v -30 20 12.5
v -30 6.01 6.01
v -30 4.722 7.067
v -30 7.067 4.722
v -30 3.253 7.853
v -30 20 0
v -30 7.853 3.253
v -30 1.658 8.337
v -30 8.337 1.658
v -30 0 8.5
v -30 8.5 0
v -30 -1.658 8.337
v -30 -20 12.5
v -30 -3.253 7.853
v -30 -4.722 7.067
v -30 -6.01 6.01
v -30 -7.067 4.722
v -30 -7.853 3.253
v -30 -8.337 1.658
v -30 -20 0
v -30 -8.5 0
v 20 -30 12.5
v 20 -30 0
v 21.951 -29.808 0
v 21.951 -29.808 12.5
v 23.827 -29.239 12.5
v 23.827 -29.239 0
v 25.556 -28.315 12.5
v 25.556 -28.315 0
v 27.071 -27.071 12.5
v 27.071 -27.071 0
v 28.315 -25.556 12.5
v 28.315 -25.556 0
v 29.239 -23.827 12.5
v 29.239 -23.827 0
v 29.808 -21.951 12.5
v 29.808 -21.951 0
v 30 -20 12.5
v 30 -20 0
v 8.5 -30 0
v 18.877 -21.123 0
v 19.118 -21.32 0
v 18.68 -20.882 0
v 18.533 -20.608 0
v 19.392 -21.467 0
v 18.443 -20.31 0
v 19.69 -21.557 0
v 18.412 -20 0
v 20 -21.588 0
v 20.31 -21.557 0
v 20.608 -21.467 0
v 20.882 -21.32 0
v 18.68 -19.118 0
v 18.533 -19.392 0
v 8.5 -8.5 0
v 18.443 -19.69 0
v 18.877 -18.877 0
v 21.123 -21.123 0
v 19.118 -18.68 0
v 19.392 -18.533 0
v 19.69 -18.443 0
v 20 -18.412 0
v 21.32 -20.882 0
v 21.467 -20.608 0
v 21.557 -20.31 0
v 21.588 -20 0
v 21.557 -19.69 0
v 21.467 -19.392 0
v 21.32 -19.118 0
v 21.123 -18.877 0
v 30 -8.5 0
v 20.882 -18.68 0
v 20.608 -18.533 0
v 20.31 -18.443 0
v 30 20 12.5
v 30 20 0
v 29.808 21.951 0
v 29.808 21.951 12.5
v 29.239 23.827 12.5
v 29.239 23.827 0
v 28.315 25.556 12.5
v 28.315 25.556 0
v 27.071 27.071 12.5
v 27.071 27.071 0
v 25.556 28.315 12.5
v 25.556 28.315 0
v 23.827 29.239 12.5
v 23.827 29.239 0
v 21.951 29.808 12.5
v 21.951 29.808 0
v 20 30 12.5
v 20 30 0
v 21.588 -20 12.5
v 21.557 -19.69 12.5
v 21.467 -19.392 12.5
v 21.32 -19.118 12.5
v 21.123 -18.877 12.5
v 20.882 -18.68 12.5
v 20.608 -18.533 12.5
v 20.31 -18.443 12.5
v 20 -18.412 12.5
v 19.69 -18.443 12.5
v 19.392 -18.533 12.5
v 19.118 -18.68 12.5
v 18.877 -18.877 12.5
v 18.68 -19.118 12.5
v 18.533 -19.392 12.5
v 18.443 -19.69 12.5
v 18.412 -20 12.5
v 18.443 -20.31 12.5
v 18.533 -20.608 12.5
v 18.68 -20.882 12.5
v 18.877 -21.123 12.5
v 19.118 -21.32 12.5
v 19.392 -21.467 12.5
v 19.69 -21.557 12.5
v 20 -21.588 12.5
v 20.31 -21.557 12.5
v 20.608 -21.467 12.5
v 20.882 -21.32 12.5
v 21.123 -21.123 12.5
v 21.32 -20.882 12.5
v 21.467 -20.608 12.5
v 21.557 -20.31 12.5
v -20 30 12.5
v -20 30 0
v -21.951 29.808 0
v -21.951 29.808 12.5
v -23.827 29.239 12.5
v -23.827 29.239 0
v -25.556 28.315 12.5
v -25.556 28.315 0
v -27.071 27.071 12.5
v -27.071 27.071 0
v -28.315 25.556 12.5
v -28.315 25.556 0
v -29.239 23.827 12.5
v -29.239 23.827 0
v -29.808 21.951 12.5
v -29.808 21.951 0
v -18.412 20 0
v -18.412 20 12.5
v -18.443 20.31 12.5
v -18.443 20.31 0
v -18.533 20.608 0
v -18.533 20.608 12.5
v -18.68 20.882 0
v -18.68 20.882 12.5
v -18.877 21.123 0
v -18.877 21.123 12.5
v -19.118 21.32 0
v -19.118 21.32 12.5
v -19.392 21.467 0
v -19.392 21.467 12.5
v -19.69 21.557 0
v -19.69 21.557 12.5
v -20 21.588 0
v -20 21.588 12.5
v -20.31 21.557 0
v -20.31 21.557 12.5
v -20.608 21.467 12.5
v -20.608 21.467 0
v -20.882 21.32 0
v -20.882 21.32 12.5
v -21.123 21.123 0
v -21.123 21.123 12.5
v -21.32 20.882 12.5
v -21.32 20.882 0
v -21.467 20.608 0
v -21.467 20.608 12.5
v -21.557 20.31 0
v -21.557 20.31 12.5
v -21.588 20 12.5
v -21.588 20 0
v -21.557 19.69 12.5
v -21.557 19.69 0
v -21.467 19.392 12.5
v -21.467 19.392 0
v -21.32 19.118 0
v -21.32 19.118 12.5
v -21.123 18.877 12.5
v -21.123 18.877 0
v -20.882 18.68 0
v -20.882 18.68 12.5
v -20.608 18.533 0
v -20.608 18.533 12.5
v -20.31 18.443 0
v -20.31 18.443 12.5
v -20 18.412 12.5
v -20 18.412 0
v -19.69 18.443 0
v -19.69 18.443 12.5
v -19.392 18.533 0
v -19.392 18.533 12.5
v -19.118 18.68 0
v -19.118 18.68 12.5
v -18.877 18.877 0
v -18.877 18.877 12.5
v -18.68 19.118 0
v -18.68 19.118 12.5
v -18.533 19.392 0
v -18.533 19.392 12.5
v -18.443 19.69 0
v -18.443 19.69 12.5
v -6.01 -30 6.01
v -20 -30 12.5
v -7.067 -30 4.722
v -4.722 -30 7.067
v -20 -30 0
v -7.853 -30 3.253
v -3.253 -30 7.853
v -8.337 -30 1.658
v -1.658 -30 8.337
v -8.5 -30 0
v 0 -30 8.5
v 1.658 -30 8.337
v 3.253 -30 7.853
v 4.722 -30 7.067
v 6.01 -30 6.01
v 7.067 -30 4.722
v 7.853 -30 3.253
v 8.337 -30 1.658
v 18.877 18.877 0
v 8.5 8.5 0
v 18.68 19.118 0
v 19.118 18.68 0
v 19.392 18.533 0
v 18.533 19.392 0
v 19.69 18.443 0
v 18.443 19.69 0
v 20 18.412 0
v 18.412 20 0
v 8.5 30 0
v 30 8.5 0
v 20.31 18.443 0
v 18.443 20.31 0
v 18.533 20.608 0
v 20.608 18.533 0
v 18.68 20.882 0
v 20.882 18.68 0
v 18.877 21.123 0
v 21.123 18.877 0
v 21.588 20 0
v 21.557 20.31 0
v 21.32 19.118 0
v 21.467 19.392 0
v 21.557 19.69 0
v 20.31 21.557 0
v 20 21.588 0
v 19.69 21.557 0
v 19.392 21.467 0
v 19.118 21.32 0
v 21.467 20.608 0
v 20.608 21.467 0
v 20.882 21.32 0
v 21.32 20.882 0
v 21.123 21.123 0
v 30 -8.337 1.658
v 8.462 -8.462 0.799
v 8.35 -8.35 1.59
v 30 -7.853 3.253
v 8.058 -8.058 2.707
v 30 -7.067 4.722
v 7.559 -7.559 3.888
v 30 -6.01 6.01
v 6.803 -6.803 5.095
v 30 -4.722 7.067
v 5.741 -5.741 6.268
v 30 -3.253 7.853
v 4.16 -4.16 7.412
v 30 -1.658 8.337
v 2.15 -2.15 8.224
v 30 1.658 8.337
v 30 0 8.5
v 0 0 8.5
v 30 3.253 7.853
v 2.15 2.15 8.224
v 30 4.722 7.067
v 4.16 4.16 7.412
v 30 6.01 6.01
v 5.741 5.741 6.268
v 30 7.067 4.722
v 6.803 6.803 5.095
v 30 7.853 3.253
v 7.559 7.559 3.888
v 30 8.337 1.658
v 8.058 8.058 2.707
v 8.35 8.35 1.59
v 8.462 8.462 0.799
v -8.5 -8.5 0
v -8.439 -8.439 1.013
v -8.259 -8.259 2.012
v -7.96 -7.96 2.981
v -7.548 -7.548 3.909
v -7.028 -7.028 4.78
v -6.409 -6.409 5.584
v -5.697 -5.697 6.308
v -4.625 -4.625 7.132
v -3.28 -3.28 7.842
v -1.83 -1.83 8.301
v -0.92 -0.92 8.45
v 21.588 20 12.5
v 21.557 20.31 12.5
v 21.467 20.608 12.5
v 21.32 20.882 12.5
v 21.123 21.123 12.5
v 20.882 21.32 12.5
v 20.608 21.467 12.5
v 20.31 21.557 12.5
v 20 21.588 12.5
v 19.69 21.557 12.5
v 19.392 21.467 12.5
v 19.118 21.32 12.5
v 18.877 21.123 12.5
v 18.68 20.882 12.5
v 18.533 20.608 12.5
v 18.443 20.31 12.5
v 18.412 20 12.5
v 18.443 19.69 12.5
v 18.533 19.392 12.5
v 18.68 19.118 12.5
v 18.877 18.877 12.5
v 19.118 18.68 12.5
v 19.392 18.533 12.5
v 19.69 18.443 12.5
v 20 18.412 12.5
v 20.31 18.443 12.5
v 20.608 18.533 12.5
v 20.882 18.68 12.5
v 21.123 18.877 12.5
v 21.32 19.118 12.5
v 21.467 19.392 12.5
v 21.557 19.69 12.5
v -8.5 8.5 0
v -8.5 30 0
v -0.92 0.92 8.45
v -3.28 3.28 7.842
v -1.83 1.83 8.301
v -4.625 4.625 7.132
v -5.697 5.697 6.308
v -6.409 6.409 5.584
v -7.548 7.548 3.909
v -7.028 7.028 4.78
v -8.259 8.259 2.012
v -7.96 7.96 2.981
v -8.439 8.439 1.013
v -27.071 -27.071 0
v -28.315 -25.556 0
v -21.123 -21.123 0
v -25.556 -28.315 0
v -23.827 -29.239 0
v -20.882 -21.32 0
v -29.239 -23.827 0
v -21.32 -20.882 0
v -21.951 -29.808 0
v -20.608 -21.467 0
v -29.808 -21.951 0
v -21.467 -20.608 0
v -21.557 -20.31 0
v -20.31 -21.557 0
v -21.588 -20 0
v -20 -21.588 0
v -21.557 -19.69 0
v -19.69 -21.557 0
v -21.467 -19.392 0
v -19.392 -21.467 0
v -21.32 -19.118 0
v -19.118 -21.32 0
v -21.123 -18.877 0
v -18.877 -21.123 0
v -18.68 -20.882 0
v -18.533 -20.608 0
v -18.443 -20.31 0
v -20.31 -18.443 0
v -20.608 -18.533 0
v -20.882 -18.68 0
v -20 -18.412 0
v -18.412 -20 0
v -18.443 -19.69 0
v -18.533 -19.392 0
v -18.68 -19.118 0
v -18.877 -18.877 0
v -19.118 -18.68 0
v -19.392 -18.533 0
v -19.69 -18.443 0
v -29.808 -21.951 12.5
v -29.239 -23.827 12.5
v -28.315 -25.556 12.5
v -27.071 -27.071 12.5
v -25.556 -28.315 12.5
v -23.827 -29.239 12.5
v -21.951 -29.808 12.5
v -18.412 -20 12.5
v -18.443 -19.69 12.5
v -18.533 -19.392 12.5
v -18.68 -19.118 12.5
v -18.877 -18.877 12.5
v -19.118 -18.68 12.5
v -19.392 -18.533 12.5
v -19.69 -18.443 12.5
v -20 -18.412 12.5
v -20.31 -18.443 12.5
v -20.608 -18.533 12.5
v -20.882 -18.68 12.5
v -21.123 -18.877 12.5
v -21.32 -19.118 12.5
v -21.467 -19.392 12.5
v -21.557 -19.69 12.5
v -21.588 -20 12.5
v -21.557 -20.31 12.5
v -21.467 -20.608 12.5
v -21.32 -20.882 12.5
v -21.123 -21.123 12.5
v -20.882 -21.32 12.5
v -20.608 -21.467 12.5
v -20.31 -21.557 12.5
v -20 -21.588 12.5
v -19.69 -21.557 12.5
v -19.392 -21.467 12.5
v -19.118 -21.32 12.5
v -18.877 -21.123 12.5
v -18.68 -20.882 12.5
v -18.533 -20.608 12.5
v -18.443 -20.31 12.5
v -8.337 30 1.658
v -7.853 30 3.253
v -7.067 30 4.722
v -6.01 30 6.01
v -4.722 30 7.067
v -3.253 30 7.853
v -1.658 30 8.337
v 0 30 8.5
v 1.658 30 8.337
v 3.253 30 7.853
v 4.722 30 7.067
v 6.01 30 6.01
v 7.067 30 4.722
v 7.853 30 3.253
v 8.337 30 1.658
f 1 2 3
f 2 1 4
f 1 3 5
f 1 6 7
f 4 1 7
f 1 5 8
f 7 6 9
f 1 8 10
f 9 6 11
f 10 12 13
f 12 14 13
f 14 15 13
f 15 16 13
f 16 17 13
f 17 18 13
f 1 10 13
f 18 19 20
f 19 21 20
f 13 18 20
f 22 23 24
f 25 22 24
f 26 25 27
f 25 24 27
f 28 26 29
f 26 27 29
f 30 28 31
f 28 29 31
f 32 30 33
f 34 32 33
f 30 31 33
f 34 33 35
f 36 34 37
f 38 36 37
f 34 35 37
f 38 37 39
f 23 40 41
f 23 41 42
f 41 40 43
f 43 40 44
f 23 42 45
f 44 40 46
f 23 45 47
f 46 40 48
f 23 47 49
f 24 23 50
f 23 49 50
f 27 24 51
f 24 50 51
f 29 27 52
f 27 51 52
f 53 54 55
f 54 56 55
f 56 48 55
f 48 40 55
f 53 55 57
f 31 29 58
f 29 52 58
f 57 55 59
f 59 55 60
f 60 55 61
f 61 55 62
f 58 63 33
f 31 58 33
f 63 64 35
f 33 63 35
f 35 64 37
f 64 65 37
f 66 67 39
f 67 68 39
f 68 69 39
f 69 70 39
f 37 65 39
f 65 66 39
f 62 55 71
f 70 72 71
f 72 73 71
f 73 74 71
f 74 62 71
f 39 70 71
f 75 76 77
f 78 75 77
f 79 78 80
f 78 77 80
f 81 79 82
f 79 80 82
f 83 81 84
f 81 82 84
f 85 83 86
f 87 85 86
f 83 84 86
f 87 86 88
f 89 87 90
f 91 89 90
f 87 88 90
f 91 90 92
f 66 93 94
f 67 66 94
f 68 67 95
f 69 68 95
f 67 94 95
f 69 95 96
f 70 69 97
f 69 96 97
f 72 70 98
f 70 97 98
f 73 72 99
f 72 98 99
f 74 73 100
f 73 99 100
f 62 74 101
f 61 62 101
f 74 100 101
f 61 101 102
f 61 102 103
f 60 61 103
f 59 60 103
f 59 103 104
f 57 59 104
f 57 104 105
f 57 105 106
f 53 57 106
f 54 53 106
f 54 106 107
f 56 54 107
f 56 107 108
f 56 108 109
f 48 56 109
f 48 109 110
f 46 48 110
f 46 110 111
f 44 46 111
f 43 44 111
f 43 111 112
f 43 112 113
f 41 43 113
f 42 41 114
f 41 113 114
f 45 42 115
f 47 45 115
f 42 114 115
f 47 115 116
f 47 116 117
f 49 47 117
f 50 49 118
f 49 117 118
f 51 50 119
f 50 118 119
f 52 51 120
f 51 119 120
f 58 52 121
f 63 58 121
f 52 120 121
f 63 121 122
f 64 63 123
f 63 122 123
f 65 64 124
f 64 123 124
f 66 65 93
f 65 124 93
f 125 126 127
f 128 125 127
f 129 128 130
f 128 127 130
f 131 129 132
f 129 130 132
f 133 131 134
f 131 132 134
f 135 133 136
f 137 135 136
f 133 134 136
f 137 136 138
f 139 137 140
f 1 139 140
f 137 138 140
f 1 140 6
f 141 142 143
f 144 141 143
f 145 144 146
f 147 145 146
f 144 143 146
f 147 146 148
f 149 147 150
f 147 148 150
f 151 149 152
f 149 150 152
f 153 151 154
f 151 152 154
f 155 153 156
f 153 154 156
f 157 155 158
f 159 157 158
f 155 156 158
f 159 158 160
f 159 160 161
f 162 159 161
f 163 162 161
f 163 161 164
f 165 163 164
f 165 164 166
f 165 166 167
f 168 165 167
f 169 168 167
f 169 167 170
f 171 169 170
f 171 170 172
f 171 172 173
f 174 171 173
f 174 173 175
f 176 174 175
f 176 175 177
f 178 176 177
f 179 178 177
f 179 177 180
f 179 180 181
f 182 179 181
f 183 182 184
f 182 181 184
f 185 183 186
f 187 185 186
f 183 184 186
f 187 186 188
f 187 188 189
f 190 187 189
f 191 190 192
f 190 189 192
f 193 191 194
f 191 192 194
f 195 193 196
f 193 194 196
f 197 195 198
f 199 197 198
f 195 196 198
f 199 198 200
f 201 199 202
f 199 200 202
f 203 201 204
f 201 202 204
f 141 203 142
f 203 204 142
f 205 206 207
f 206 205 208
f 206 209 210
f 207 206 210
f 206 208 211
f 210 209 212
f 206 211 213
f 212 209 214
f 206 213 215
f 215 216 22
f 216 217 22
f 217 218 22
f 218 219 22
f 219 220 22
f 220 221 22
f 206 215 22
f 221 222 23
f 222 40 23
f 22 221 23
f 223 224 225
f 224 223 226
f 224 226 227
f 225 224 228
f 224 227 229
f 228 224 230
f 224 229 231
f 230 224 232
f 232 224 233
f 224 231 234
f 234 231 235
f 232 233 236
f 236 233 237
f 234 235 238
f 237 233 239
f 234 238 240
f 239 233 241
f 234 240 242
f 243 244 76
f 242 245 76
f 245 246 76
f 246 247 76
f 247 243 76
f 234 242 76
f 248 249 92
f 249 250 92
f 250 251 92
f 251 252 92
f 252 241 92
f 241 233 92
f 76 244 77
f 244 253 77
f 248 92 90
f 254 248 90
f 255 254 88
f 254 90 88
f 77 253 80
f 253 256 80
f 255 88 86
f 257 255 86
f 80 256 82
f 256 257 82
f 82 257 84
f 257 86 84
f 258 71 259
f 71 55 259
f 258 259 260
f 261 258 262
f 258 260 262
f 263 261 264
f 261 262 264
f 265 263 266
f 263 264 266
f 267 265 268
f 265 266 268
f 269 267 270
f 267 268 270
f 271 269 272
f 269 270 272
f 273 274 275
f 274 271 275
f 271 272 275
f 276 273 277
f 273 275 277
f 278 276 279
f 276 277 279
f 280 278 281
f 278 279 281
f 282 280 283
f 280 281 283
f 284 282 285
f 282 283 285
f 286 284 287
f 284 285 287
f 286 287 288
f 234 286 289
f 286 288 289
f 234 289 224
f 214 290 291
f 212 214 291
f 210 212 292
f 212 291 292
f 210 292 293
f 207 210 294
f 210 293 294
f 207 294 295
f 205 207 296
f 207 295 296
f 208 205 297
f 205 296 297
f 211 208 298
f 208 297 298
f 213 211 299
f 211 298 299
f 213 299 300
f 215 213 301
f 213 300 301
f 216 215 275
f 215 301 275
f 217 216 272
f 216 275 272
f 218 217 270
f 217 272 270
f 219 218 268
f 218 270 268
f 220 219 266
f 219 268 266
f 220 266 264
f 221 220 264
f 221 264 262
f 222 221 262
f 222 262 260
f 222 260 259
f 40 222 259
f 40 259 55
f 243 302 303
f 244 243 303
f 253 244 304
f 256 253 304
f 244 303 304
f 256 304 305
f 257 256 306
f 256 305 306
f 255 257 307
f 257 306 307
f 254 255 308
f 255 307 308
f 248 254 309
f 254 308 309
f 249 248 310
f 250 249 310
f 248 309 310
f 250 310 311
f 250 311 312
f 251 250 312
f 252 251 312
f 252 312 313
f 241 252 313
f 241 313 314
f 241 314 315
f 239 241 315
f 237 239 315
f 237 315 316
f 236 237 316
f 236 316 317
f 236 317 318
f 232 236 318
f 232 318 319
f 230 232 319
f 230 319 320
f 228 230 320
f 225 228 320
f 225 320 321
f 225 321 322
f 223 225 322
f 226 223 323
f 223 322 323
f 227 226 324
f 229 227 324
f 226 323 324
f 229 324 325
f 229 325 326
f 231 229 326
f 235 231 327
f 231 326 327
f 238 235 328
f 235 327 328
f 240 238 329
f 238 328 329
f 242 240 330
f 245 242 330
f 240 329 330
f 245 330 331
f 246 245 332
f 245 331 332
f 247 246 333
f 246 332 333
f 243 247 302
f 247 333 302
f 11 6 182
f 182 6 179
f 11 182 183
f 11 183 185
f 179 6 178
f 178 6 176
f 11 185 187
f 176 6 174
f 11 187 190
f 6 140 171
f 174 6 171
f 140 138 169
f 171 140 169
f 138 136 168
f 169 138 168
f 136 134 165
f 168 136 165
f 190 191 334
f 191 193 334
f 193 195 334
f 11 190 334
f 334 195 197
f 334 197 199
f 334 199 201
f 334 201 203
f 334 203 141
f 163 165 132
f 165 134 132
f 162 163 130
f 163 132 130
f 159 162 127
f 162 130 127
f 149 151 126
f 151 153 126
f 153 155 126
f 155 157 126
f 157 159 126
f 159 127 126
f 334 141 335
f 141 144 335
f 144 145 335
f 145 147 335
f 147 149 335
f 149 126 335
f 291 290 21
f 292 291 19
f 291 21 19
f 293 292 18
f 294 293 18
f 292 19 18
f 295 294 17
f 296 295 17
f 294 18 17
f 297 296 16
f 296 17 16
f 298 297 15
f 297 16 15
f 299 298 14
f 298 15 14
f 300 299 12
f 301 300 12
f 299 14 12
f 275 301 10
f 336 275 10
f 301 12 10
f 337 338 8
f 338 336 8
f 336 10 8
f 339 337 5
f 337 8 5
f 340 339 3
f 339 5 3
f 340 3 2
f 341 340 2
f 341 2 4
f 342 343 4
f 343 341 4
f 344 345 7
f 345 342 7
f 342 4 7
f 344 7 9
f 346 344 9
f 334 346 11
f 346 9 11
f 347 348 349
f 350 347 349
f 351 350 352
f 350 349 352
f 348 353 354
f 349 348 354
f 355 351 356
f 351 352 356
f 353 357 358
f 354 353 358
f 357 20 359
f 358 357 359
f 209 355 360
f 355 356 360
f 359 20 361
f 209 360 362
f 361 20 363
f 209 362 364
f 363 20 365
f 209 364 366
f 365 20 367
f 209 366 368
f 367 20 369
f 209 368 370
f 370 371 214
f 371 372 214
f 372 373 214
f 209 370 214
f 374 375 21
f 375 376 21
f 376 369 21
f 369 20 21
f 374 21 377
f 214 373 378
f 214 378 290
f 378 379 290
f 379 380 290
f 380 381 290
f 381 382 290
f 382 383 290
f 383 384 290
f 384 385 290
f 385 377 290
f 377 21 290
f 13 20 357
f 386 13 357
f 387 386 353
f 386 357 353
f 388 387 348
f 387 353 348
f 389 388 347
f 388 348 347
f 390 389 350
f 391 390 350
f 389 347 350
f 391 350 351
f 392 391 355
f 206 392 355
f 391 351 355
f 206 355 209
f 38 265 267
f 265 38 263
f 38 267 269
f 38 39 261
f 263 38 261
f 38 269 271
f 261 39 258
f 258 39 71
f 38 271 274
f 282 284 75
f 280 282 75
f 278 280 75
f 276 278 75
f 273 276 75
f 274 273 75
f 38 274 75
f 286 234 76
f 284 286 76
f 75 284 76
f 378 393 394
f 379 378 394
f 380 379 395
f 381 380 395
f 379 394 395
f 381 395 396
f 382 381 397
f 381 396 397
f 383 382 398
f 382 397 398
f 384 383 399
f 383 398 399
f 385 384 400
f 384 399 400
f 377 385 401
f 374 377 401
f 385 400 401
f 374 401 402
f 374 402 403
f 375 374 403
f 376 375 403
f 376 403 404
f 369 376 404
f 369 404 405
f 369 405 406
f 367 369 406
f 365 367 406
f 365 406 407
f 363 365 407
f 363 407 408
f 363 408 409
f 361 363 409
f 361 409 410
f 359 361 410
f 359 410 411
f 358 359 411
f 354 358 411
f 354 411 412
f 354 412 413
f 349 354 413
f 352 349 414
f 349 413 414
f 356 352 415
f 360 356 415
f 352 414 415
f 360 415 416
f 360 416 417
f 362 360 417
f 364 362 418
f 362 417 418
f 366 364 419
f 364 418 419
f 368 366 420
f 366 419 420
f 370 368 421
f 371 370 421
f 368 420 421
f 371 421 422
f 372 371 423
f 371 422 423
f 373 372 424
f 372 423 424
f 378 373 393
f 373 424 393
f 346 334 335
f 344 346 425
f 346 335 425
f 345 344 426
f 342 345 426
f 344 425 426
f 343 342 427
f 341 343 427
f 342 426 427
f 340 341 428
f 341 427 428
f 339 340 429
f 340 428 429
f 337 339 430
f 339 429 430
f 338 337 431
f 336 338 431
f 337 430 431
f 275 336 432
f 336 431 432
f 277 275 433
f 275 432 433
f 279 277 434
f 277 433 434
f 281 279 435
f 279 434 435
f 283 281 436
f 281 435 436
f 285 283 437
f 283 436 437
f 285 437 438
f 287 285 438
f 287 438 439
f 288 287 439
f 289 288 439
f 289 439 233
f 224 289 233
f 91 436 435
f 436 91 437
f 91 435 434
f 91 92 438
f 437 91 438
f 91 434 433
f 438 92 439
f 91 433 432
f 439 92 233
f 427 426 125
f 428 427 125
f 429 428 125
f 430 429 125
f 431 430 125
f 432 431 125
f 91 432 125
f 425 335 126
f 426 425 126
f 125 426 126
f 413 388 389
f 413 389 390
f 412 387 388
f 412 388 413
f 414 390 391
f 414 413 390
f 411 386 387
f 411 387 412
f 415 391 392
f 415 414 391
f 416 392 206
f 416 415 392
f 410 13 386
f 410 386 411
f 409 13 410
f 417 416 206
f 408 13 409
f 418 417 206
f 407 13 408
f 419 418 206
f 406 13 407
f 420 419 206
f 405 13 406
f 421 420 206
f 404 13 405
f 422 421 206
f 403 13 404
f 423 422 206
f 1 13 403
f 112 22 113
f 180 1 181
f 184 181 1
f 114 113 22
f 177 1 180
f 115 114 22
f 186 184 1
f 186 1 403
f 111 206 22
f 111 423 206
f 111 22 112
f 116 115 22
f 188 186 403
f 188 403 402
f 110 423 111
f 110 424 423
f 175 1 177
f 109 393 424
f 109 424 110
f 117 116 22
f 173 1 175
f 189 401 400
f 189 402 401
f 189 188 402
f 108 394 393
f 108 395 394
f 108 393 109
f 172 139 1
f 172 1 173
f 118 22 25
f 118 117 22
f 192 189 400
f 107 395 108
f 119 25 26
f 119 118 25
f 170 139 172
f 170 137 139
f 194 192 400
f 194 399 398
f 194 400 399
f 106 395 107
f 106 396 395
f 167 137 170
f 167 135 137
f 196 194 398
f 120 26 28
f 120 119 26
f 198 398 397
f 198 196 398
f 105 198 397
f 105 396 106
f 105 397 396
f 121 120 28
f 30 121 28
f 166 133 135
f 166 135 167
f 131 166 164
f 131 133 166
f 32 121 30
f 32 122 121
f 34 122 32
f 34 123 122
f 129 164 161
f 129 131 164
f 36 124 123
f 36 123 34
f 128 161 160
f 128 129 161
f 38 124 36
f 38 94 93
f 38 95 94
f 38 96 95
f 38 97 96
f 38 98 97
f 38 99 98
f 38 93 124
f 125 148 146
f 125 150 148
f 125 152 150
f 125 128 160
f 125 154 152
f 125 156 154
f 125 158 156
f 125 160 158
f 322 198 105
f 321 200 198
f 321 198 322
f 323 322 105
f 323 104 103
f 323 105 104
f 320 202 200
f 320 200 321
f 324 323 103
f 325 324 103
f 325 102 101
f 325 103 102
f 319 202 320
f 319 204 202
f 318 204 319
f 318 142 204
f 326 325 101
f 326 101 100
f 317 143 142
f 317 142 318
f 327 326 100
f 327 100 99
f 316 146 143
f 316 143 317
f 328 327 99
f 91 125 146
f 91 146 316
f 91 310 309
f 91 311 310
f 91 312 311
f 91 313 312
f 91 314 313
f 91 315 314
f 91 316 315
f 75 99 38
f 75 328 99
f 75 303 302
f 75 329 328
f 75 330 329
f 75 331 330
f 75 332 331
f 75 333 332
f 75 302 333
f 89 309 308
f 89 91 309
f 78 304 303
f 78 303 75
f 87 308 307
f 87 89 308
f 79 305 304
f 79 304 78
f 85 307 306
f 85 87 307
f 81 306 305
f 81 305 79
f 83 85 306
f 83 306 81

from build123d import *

# Parameters (mm, degrees)
SALIENTE_EXTRUIR1_DEPTH = 12.5
CROQUIS2_R              = 8.5
CORTAR_EXTRUIR1_DEPTH   = 41.25
CROQUIS3_R              = 8.5
CORTAR_EXTRUIR2_DEPTH   = 82.5
CROQUIS4_R              = 1.5875
CORTAR_EXTRUIR3_DEPTH   = 82.5


with BuildPart() as part:
    # Croquis1 → Saliente-Extruir1 (new body)
    with BuildSketch(Plane.XY):
        with BuildLine():
            Line((-20, -30), (20, -30))
            ThreePointArc((20, -30), (27.071067812, -27.071067812), (30, -20))
            Line((30, -20), (30, 20))
            ThreePointArc((30, 20), (27.071067812, 27.071067812), (20, 30))
            Line((20, 30), (-20, 30))
            ThreePointArc((-20, 30), (-27.071067812, 27.071067812), (-30, 20))
            Line((-30, 20), (-30, -20))
            ThreePointArc((-30, -20), (-27.071067812, -27.071067812), (-20, -30))
        make_face()
    extrude(amount=SALIENTE_EXTRUIR1_DEPTH)

    # Croquis2 → Cortar-Extruir1 (cut, symmetric)
    with BuildSketch(Plane(origin=(0, 0, 0), x_dir=(1, 0, 0), z_dir=(0, 1, 0))):
        Circle(CROQUIS2_R)
    extrude(amount=CORTAR_EXTRUIR1_DEPTH, both=True, mode=Mode.SUBTRACT)

    # Croquis3 → Cortar-Extruir2 (cut)
    with BuildSketch(Plane.ZY.offset(30)):
        Circle(CROQUIS3_R)
    extrude(amount=-CORTAR_EXTRUIR2_DEPTH, mode=Mode.SUBTRACT)

    # Croquis4 → Cortar-Extruir3 (cut)
    with BuildSketch(Plane.XY.offset(12.5)):
        with Locations((-20, 20)):
            Circle(CROQUIS4_R)
        with Locations((20, 20)):
            Circle(CROQUIS4_R)
        with Locations((20, -20)):
            Circle(CROQUIS4_R)
        with Locations((-20, -20)):
            Circle(CROQUIS4_R)
    extrude(amount=-CORTAR_EXTRUIR3_DEPTH, mode=Mode.SUBTRACT)


solid = part.part
